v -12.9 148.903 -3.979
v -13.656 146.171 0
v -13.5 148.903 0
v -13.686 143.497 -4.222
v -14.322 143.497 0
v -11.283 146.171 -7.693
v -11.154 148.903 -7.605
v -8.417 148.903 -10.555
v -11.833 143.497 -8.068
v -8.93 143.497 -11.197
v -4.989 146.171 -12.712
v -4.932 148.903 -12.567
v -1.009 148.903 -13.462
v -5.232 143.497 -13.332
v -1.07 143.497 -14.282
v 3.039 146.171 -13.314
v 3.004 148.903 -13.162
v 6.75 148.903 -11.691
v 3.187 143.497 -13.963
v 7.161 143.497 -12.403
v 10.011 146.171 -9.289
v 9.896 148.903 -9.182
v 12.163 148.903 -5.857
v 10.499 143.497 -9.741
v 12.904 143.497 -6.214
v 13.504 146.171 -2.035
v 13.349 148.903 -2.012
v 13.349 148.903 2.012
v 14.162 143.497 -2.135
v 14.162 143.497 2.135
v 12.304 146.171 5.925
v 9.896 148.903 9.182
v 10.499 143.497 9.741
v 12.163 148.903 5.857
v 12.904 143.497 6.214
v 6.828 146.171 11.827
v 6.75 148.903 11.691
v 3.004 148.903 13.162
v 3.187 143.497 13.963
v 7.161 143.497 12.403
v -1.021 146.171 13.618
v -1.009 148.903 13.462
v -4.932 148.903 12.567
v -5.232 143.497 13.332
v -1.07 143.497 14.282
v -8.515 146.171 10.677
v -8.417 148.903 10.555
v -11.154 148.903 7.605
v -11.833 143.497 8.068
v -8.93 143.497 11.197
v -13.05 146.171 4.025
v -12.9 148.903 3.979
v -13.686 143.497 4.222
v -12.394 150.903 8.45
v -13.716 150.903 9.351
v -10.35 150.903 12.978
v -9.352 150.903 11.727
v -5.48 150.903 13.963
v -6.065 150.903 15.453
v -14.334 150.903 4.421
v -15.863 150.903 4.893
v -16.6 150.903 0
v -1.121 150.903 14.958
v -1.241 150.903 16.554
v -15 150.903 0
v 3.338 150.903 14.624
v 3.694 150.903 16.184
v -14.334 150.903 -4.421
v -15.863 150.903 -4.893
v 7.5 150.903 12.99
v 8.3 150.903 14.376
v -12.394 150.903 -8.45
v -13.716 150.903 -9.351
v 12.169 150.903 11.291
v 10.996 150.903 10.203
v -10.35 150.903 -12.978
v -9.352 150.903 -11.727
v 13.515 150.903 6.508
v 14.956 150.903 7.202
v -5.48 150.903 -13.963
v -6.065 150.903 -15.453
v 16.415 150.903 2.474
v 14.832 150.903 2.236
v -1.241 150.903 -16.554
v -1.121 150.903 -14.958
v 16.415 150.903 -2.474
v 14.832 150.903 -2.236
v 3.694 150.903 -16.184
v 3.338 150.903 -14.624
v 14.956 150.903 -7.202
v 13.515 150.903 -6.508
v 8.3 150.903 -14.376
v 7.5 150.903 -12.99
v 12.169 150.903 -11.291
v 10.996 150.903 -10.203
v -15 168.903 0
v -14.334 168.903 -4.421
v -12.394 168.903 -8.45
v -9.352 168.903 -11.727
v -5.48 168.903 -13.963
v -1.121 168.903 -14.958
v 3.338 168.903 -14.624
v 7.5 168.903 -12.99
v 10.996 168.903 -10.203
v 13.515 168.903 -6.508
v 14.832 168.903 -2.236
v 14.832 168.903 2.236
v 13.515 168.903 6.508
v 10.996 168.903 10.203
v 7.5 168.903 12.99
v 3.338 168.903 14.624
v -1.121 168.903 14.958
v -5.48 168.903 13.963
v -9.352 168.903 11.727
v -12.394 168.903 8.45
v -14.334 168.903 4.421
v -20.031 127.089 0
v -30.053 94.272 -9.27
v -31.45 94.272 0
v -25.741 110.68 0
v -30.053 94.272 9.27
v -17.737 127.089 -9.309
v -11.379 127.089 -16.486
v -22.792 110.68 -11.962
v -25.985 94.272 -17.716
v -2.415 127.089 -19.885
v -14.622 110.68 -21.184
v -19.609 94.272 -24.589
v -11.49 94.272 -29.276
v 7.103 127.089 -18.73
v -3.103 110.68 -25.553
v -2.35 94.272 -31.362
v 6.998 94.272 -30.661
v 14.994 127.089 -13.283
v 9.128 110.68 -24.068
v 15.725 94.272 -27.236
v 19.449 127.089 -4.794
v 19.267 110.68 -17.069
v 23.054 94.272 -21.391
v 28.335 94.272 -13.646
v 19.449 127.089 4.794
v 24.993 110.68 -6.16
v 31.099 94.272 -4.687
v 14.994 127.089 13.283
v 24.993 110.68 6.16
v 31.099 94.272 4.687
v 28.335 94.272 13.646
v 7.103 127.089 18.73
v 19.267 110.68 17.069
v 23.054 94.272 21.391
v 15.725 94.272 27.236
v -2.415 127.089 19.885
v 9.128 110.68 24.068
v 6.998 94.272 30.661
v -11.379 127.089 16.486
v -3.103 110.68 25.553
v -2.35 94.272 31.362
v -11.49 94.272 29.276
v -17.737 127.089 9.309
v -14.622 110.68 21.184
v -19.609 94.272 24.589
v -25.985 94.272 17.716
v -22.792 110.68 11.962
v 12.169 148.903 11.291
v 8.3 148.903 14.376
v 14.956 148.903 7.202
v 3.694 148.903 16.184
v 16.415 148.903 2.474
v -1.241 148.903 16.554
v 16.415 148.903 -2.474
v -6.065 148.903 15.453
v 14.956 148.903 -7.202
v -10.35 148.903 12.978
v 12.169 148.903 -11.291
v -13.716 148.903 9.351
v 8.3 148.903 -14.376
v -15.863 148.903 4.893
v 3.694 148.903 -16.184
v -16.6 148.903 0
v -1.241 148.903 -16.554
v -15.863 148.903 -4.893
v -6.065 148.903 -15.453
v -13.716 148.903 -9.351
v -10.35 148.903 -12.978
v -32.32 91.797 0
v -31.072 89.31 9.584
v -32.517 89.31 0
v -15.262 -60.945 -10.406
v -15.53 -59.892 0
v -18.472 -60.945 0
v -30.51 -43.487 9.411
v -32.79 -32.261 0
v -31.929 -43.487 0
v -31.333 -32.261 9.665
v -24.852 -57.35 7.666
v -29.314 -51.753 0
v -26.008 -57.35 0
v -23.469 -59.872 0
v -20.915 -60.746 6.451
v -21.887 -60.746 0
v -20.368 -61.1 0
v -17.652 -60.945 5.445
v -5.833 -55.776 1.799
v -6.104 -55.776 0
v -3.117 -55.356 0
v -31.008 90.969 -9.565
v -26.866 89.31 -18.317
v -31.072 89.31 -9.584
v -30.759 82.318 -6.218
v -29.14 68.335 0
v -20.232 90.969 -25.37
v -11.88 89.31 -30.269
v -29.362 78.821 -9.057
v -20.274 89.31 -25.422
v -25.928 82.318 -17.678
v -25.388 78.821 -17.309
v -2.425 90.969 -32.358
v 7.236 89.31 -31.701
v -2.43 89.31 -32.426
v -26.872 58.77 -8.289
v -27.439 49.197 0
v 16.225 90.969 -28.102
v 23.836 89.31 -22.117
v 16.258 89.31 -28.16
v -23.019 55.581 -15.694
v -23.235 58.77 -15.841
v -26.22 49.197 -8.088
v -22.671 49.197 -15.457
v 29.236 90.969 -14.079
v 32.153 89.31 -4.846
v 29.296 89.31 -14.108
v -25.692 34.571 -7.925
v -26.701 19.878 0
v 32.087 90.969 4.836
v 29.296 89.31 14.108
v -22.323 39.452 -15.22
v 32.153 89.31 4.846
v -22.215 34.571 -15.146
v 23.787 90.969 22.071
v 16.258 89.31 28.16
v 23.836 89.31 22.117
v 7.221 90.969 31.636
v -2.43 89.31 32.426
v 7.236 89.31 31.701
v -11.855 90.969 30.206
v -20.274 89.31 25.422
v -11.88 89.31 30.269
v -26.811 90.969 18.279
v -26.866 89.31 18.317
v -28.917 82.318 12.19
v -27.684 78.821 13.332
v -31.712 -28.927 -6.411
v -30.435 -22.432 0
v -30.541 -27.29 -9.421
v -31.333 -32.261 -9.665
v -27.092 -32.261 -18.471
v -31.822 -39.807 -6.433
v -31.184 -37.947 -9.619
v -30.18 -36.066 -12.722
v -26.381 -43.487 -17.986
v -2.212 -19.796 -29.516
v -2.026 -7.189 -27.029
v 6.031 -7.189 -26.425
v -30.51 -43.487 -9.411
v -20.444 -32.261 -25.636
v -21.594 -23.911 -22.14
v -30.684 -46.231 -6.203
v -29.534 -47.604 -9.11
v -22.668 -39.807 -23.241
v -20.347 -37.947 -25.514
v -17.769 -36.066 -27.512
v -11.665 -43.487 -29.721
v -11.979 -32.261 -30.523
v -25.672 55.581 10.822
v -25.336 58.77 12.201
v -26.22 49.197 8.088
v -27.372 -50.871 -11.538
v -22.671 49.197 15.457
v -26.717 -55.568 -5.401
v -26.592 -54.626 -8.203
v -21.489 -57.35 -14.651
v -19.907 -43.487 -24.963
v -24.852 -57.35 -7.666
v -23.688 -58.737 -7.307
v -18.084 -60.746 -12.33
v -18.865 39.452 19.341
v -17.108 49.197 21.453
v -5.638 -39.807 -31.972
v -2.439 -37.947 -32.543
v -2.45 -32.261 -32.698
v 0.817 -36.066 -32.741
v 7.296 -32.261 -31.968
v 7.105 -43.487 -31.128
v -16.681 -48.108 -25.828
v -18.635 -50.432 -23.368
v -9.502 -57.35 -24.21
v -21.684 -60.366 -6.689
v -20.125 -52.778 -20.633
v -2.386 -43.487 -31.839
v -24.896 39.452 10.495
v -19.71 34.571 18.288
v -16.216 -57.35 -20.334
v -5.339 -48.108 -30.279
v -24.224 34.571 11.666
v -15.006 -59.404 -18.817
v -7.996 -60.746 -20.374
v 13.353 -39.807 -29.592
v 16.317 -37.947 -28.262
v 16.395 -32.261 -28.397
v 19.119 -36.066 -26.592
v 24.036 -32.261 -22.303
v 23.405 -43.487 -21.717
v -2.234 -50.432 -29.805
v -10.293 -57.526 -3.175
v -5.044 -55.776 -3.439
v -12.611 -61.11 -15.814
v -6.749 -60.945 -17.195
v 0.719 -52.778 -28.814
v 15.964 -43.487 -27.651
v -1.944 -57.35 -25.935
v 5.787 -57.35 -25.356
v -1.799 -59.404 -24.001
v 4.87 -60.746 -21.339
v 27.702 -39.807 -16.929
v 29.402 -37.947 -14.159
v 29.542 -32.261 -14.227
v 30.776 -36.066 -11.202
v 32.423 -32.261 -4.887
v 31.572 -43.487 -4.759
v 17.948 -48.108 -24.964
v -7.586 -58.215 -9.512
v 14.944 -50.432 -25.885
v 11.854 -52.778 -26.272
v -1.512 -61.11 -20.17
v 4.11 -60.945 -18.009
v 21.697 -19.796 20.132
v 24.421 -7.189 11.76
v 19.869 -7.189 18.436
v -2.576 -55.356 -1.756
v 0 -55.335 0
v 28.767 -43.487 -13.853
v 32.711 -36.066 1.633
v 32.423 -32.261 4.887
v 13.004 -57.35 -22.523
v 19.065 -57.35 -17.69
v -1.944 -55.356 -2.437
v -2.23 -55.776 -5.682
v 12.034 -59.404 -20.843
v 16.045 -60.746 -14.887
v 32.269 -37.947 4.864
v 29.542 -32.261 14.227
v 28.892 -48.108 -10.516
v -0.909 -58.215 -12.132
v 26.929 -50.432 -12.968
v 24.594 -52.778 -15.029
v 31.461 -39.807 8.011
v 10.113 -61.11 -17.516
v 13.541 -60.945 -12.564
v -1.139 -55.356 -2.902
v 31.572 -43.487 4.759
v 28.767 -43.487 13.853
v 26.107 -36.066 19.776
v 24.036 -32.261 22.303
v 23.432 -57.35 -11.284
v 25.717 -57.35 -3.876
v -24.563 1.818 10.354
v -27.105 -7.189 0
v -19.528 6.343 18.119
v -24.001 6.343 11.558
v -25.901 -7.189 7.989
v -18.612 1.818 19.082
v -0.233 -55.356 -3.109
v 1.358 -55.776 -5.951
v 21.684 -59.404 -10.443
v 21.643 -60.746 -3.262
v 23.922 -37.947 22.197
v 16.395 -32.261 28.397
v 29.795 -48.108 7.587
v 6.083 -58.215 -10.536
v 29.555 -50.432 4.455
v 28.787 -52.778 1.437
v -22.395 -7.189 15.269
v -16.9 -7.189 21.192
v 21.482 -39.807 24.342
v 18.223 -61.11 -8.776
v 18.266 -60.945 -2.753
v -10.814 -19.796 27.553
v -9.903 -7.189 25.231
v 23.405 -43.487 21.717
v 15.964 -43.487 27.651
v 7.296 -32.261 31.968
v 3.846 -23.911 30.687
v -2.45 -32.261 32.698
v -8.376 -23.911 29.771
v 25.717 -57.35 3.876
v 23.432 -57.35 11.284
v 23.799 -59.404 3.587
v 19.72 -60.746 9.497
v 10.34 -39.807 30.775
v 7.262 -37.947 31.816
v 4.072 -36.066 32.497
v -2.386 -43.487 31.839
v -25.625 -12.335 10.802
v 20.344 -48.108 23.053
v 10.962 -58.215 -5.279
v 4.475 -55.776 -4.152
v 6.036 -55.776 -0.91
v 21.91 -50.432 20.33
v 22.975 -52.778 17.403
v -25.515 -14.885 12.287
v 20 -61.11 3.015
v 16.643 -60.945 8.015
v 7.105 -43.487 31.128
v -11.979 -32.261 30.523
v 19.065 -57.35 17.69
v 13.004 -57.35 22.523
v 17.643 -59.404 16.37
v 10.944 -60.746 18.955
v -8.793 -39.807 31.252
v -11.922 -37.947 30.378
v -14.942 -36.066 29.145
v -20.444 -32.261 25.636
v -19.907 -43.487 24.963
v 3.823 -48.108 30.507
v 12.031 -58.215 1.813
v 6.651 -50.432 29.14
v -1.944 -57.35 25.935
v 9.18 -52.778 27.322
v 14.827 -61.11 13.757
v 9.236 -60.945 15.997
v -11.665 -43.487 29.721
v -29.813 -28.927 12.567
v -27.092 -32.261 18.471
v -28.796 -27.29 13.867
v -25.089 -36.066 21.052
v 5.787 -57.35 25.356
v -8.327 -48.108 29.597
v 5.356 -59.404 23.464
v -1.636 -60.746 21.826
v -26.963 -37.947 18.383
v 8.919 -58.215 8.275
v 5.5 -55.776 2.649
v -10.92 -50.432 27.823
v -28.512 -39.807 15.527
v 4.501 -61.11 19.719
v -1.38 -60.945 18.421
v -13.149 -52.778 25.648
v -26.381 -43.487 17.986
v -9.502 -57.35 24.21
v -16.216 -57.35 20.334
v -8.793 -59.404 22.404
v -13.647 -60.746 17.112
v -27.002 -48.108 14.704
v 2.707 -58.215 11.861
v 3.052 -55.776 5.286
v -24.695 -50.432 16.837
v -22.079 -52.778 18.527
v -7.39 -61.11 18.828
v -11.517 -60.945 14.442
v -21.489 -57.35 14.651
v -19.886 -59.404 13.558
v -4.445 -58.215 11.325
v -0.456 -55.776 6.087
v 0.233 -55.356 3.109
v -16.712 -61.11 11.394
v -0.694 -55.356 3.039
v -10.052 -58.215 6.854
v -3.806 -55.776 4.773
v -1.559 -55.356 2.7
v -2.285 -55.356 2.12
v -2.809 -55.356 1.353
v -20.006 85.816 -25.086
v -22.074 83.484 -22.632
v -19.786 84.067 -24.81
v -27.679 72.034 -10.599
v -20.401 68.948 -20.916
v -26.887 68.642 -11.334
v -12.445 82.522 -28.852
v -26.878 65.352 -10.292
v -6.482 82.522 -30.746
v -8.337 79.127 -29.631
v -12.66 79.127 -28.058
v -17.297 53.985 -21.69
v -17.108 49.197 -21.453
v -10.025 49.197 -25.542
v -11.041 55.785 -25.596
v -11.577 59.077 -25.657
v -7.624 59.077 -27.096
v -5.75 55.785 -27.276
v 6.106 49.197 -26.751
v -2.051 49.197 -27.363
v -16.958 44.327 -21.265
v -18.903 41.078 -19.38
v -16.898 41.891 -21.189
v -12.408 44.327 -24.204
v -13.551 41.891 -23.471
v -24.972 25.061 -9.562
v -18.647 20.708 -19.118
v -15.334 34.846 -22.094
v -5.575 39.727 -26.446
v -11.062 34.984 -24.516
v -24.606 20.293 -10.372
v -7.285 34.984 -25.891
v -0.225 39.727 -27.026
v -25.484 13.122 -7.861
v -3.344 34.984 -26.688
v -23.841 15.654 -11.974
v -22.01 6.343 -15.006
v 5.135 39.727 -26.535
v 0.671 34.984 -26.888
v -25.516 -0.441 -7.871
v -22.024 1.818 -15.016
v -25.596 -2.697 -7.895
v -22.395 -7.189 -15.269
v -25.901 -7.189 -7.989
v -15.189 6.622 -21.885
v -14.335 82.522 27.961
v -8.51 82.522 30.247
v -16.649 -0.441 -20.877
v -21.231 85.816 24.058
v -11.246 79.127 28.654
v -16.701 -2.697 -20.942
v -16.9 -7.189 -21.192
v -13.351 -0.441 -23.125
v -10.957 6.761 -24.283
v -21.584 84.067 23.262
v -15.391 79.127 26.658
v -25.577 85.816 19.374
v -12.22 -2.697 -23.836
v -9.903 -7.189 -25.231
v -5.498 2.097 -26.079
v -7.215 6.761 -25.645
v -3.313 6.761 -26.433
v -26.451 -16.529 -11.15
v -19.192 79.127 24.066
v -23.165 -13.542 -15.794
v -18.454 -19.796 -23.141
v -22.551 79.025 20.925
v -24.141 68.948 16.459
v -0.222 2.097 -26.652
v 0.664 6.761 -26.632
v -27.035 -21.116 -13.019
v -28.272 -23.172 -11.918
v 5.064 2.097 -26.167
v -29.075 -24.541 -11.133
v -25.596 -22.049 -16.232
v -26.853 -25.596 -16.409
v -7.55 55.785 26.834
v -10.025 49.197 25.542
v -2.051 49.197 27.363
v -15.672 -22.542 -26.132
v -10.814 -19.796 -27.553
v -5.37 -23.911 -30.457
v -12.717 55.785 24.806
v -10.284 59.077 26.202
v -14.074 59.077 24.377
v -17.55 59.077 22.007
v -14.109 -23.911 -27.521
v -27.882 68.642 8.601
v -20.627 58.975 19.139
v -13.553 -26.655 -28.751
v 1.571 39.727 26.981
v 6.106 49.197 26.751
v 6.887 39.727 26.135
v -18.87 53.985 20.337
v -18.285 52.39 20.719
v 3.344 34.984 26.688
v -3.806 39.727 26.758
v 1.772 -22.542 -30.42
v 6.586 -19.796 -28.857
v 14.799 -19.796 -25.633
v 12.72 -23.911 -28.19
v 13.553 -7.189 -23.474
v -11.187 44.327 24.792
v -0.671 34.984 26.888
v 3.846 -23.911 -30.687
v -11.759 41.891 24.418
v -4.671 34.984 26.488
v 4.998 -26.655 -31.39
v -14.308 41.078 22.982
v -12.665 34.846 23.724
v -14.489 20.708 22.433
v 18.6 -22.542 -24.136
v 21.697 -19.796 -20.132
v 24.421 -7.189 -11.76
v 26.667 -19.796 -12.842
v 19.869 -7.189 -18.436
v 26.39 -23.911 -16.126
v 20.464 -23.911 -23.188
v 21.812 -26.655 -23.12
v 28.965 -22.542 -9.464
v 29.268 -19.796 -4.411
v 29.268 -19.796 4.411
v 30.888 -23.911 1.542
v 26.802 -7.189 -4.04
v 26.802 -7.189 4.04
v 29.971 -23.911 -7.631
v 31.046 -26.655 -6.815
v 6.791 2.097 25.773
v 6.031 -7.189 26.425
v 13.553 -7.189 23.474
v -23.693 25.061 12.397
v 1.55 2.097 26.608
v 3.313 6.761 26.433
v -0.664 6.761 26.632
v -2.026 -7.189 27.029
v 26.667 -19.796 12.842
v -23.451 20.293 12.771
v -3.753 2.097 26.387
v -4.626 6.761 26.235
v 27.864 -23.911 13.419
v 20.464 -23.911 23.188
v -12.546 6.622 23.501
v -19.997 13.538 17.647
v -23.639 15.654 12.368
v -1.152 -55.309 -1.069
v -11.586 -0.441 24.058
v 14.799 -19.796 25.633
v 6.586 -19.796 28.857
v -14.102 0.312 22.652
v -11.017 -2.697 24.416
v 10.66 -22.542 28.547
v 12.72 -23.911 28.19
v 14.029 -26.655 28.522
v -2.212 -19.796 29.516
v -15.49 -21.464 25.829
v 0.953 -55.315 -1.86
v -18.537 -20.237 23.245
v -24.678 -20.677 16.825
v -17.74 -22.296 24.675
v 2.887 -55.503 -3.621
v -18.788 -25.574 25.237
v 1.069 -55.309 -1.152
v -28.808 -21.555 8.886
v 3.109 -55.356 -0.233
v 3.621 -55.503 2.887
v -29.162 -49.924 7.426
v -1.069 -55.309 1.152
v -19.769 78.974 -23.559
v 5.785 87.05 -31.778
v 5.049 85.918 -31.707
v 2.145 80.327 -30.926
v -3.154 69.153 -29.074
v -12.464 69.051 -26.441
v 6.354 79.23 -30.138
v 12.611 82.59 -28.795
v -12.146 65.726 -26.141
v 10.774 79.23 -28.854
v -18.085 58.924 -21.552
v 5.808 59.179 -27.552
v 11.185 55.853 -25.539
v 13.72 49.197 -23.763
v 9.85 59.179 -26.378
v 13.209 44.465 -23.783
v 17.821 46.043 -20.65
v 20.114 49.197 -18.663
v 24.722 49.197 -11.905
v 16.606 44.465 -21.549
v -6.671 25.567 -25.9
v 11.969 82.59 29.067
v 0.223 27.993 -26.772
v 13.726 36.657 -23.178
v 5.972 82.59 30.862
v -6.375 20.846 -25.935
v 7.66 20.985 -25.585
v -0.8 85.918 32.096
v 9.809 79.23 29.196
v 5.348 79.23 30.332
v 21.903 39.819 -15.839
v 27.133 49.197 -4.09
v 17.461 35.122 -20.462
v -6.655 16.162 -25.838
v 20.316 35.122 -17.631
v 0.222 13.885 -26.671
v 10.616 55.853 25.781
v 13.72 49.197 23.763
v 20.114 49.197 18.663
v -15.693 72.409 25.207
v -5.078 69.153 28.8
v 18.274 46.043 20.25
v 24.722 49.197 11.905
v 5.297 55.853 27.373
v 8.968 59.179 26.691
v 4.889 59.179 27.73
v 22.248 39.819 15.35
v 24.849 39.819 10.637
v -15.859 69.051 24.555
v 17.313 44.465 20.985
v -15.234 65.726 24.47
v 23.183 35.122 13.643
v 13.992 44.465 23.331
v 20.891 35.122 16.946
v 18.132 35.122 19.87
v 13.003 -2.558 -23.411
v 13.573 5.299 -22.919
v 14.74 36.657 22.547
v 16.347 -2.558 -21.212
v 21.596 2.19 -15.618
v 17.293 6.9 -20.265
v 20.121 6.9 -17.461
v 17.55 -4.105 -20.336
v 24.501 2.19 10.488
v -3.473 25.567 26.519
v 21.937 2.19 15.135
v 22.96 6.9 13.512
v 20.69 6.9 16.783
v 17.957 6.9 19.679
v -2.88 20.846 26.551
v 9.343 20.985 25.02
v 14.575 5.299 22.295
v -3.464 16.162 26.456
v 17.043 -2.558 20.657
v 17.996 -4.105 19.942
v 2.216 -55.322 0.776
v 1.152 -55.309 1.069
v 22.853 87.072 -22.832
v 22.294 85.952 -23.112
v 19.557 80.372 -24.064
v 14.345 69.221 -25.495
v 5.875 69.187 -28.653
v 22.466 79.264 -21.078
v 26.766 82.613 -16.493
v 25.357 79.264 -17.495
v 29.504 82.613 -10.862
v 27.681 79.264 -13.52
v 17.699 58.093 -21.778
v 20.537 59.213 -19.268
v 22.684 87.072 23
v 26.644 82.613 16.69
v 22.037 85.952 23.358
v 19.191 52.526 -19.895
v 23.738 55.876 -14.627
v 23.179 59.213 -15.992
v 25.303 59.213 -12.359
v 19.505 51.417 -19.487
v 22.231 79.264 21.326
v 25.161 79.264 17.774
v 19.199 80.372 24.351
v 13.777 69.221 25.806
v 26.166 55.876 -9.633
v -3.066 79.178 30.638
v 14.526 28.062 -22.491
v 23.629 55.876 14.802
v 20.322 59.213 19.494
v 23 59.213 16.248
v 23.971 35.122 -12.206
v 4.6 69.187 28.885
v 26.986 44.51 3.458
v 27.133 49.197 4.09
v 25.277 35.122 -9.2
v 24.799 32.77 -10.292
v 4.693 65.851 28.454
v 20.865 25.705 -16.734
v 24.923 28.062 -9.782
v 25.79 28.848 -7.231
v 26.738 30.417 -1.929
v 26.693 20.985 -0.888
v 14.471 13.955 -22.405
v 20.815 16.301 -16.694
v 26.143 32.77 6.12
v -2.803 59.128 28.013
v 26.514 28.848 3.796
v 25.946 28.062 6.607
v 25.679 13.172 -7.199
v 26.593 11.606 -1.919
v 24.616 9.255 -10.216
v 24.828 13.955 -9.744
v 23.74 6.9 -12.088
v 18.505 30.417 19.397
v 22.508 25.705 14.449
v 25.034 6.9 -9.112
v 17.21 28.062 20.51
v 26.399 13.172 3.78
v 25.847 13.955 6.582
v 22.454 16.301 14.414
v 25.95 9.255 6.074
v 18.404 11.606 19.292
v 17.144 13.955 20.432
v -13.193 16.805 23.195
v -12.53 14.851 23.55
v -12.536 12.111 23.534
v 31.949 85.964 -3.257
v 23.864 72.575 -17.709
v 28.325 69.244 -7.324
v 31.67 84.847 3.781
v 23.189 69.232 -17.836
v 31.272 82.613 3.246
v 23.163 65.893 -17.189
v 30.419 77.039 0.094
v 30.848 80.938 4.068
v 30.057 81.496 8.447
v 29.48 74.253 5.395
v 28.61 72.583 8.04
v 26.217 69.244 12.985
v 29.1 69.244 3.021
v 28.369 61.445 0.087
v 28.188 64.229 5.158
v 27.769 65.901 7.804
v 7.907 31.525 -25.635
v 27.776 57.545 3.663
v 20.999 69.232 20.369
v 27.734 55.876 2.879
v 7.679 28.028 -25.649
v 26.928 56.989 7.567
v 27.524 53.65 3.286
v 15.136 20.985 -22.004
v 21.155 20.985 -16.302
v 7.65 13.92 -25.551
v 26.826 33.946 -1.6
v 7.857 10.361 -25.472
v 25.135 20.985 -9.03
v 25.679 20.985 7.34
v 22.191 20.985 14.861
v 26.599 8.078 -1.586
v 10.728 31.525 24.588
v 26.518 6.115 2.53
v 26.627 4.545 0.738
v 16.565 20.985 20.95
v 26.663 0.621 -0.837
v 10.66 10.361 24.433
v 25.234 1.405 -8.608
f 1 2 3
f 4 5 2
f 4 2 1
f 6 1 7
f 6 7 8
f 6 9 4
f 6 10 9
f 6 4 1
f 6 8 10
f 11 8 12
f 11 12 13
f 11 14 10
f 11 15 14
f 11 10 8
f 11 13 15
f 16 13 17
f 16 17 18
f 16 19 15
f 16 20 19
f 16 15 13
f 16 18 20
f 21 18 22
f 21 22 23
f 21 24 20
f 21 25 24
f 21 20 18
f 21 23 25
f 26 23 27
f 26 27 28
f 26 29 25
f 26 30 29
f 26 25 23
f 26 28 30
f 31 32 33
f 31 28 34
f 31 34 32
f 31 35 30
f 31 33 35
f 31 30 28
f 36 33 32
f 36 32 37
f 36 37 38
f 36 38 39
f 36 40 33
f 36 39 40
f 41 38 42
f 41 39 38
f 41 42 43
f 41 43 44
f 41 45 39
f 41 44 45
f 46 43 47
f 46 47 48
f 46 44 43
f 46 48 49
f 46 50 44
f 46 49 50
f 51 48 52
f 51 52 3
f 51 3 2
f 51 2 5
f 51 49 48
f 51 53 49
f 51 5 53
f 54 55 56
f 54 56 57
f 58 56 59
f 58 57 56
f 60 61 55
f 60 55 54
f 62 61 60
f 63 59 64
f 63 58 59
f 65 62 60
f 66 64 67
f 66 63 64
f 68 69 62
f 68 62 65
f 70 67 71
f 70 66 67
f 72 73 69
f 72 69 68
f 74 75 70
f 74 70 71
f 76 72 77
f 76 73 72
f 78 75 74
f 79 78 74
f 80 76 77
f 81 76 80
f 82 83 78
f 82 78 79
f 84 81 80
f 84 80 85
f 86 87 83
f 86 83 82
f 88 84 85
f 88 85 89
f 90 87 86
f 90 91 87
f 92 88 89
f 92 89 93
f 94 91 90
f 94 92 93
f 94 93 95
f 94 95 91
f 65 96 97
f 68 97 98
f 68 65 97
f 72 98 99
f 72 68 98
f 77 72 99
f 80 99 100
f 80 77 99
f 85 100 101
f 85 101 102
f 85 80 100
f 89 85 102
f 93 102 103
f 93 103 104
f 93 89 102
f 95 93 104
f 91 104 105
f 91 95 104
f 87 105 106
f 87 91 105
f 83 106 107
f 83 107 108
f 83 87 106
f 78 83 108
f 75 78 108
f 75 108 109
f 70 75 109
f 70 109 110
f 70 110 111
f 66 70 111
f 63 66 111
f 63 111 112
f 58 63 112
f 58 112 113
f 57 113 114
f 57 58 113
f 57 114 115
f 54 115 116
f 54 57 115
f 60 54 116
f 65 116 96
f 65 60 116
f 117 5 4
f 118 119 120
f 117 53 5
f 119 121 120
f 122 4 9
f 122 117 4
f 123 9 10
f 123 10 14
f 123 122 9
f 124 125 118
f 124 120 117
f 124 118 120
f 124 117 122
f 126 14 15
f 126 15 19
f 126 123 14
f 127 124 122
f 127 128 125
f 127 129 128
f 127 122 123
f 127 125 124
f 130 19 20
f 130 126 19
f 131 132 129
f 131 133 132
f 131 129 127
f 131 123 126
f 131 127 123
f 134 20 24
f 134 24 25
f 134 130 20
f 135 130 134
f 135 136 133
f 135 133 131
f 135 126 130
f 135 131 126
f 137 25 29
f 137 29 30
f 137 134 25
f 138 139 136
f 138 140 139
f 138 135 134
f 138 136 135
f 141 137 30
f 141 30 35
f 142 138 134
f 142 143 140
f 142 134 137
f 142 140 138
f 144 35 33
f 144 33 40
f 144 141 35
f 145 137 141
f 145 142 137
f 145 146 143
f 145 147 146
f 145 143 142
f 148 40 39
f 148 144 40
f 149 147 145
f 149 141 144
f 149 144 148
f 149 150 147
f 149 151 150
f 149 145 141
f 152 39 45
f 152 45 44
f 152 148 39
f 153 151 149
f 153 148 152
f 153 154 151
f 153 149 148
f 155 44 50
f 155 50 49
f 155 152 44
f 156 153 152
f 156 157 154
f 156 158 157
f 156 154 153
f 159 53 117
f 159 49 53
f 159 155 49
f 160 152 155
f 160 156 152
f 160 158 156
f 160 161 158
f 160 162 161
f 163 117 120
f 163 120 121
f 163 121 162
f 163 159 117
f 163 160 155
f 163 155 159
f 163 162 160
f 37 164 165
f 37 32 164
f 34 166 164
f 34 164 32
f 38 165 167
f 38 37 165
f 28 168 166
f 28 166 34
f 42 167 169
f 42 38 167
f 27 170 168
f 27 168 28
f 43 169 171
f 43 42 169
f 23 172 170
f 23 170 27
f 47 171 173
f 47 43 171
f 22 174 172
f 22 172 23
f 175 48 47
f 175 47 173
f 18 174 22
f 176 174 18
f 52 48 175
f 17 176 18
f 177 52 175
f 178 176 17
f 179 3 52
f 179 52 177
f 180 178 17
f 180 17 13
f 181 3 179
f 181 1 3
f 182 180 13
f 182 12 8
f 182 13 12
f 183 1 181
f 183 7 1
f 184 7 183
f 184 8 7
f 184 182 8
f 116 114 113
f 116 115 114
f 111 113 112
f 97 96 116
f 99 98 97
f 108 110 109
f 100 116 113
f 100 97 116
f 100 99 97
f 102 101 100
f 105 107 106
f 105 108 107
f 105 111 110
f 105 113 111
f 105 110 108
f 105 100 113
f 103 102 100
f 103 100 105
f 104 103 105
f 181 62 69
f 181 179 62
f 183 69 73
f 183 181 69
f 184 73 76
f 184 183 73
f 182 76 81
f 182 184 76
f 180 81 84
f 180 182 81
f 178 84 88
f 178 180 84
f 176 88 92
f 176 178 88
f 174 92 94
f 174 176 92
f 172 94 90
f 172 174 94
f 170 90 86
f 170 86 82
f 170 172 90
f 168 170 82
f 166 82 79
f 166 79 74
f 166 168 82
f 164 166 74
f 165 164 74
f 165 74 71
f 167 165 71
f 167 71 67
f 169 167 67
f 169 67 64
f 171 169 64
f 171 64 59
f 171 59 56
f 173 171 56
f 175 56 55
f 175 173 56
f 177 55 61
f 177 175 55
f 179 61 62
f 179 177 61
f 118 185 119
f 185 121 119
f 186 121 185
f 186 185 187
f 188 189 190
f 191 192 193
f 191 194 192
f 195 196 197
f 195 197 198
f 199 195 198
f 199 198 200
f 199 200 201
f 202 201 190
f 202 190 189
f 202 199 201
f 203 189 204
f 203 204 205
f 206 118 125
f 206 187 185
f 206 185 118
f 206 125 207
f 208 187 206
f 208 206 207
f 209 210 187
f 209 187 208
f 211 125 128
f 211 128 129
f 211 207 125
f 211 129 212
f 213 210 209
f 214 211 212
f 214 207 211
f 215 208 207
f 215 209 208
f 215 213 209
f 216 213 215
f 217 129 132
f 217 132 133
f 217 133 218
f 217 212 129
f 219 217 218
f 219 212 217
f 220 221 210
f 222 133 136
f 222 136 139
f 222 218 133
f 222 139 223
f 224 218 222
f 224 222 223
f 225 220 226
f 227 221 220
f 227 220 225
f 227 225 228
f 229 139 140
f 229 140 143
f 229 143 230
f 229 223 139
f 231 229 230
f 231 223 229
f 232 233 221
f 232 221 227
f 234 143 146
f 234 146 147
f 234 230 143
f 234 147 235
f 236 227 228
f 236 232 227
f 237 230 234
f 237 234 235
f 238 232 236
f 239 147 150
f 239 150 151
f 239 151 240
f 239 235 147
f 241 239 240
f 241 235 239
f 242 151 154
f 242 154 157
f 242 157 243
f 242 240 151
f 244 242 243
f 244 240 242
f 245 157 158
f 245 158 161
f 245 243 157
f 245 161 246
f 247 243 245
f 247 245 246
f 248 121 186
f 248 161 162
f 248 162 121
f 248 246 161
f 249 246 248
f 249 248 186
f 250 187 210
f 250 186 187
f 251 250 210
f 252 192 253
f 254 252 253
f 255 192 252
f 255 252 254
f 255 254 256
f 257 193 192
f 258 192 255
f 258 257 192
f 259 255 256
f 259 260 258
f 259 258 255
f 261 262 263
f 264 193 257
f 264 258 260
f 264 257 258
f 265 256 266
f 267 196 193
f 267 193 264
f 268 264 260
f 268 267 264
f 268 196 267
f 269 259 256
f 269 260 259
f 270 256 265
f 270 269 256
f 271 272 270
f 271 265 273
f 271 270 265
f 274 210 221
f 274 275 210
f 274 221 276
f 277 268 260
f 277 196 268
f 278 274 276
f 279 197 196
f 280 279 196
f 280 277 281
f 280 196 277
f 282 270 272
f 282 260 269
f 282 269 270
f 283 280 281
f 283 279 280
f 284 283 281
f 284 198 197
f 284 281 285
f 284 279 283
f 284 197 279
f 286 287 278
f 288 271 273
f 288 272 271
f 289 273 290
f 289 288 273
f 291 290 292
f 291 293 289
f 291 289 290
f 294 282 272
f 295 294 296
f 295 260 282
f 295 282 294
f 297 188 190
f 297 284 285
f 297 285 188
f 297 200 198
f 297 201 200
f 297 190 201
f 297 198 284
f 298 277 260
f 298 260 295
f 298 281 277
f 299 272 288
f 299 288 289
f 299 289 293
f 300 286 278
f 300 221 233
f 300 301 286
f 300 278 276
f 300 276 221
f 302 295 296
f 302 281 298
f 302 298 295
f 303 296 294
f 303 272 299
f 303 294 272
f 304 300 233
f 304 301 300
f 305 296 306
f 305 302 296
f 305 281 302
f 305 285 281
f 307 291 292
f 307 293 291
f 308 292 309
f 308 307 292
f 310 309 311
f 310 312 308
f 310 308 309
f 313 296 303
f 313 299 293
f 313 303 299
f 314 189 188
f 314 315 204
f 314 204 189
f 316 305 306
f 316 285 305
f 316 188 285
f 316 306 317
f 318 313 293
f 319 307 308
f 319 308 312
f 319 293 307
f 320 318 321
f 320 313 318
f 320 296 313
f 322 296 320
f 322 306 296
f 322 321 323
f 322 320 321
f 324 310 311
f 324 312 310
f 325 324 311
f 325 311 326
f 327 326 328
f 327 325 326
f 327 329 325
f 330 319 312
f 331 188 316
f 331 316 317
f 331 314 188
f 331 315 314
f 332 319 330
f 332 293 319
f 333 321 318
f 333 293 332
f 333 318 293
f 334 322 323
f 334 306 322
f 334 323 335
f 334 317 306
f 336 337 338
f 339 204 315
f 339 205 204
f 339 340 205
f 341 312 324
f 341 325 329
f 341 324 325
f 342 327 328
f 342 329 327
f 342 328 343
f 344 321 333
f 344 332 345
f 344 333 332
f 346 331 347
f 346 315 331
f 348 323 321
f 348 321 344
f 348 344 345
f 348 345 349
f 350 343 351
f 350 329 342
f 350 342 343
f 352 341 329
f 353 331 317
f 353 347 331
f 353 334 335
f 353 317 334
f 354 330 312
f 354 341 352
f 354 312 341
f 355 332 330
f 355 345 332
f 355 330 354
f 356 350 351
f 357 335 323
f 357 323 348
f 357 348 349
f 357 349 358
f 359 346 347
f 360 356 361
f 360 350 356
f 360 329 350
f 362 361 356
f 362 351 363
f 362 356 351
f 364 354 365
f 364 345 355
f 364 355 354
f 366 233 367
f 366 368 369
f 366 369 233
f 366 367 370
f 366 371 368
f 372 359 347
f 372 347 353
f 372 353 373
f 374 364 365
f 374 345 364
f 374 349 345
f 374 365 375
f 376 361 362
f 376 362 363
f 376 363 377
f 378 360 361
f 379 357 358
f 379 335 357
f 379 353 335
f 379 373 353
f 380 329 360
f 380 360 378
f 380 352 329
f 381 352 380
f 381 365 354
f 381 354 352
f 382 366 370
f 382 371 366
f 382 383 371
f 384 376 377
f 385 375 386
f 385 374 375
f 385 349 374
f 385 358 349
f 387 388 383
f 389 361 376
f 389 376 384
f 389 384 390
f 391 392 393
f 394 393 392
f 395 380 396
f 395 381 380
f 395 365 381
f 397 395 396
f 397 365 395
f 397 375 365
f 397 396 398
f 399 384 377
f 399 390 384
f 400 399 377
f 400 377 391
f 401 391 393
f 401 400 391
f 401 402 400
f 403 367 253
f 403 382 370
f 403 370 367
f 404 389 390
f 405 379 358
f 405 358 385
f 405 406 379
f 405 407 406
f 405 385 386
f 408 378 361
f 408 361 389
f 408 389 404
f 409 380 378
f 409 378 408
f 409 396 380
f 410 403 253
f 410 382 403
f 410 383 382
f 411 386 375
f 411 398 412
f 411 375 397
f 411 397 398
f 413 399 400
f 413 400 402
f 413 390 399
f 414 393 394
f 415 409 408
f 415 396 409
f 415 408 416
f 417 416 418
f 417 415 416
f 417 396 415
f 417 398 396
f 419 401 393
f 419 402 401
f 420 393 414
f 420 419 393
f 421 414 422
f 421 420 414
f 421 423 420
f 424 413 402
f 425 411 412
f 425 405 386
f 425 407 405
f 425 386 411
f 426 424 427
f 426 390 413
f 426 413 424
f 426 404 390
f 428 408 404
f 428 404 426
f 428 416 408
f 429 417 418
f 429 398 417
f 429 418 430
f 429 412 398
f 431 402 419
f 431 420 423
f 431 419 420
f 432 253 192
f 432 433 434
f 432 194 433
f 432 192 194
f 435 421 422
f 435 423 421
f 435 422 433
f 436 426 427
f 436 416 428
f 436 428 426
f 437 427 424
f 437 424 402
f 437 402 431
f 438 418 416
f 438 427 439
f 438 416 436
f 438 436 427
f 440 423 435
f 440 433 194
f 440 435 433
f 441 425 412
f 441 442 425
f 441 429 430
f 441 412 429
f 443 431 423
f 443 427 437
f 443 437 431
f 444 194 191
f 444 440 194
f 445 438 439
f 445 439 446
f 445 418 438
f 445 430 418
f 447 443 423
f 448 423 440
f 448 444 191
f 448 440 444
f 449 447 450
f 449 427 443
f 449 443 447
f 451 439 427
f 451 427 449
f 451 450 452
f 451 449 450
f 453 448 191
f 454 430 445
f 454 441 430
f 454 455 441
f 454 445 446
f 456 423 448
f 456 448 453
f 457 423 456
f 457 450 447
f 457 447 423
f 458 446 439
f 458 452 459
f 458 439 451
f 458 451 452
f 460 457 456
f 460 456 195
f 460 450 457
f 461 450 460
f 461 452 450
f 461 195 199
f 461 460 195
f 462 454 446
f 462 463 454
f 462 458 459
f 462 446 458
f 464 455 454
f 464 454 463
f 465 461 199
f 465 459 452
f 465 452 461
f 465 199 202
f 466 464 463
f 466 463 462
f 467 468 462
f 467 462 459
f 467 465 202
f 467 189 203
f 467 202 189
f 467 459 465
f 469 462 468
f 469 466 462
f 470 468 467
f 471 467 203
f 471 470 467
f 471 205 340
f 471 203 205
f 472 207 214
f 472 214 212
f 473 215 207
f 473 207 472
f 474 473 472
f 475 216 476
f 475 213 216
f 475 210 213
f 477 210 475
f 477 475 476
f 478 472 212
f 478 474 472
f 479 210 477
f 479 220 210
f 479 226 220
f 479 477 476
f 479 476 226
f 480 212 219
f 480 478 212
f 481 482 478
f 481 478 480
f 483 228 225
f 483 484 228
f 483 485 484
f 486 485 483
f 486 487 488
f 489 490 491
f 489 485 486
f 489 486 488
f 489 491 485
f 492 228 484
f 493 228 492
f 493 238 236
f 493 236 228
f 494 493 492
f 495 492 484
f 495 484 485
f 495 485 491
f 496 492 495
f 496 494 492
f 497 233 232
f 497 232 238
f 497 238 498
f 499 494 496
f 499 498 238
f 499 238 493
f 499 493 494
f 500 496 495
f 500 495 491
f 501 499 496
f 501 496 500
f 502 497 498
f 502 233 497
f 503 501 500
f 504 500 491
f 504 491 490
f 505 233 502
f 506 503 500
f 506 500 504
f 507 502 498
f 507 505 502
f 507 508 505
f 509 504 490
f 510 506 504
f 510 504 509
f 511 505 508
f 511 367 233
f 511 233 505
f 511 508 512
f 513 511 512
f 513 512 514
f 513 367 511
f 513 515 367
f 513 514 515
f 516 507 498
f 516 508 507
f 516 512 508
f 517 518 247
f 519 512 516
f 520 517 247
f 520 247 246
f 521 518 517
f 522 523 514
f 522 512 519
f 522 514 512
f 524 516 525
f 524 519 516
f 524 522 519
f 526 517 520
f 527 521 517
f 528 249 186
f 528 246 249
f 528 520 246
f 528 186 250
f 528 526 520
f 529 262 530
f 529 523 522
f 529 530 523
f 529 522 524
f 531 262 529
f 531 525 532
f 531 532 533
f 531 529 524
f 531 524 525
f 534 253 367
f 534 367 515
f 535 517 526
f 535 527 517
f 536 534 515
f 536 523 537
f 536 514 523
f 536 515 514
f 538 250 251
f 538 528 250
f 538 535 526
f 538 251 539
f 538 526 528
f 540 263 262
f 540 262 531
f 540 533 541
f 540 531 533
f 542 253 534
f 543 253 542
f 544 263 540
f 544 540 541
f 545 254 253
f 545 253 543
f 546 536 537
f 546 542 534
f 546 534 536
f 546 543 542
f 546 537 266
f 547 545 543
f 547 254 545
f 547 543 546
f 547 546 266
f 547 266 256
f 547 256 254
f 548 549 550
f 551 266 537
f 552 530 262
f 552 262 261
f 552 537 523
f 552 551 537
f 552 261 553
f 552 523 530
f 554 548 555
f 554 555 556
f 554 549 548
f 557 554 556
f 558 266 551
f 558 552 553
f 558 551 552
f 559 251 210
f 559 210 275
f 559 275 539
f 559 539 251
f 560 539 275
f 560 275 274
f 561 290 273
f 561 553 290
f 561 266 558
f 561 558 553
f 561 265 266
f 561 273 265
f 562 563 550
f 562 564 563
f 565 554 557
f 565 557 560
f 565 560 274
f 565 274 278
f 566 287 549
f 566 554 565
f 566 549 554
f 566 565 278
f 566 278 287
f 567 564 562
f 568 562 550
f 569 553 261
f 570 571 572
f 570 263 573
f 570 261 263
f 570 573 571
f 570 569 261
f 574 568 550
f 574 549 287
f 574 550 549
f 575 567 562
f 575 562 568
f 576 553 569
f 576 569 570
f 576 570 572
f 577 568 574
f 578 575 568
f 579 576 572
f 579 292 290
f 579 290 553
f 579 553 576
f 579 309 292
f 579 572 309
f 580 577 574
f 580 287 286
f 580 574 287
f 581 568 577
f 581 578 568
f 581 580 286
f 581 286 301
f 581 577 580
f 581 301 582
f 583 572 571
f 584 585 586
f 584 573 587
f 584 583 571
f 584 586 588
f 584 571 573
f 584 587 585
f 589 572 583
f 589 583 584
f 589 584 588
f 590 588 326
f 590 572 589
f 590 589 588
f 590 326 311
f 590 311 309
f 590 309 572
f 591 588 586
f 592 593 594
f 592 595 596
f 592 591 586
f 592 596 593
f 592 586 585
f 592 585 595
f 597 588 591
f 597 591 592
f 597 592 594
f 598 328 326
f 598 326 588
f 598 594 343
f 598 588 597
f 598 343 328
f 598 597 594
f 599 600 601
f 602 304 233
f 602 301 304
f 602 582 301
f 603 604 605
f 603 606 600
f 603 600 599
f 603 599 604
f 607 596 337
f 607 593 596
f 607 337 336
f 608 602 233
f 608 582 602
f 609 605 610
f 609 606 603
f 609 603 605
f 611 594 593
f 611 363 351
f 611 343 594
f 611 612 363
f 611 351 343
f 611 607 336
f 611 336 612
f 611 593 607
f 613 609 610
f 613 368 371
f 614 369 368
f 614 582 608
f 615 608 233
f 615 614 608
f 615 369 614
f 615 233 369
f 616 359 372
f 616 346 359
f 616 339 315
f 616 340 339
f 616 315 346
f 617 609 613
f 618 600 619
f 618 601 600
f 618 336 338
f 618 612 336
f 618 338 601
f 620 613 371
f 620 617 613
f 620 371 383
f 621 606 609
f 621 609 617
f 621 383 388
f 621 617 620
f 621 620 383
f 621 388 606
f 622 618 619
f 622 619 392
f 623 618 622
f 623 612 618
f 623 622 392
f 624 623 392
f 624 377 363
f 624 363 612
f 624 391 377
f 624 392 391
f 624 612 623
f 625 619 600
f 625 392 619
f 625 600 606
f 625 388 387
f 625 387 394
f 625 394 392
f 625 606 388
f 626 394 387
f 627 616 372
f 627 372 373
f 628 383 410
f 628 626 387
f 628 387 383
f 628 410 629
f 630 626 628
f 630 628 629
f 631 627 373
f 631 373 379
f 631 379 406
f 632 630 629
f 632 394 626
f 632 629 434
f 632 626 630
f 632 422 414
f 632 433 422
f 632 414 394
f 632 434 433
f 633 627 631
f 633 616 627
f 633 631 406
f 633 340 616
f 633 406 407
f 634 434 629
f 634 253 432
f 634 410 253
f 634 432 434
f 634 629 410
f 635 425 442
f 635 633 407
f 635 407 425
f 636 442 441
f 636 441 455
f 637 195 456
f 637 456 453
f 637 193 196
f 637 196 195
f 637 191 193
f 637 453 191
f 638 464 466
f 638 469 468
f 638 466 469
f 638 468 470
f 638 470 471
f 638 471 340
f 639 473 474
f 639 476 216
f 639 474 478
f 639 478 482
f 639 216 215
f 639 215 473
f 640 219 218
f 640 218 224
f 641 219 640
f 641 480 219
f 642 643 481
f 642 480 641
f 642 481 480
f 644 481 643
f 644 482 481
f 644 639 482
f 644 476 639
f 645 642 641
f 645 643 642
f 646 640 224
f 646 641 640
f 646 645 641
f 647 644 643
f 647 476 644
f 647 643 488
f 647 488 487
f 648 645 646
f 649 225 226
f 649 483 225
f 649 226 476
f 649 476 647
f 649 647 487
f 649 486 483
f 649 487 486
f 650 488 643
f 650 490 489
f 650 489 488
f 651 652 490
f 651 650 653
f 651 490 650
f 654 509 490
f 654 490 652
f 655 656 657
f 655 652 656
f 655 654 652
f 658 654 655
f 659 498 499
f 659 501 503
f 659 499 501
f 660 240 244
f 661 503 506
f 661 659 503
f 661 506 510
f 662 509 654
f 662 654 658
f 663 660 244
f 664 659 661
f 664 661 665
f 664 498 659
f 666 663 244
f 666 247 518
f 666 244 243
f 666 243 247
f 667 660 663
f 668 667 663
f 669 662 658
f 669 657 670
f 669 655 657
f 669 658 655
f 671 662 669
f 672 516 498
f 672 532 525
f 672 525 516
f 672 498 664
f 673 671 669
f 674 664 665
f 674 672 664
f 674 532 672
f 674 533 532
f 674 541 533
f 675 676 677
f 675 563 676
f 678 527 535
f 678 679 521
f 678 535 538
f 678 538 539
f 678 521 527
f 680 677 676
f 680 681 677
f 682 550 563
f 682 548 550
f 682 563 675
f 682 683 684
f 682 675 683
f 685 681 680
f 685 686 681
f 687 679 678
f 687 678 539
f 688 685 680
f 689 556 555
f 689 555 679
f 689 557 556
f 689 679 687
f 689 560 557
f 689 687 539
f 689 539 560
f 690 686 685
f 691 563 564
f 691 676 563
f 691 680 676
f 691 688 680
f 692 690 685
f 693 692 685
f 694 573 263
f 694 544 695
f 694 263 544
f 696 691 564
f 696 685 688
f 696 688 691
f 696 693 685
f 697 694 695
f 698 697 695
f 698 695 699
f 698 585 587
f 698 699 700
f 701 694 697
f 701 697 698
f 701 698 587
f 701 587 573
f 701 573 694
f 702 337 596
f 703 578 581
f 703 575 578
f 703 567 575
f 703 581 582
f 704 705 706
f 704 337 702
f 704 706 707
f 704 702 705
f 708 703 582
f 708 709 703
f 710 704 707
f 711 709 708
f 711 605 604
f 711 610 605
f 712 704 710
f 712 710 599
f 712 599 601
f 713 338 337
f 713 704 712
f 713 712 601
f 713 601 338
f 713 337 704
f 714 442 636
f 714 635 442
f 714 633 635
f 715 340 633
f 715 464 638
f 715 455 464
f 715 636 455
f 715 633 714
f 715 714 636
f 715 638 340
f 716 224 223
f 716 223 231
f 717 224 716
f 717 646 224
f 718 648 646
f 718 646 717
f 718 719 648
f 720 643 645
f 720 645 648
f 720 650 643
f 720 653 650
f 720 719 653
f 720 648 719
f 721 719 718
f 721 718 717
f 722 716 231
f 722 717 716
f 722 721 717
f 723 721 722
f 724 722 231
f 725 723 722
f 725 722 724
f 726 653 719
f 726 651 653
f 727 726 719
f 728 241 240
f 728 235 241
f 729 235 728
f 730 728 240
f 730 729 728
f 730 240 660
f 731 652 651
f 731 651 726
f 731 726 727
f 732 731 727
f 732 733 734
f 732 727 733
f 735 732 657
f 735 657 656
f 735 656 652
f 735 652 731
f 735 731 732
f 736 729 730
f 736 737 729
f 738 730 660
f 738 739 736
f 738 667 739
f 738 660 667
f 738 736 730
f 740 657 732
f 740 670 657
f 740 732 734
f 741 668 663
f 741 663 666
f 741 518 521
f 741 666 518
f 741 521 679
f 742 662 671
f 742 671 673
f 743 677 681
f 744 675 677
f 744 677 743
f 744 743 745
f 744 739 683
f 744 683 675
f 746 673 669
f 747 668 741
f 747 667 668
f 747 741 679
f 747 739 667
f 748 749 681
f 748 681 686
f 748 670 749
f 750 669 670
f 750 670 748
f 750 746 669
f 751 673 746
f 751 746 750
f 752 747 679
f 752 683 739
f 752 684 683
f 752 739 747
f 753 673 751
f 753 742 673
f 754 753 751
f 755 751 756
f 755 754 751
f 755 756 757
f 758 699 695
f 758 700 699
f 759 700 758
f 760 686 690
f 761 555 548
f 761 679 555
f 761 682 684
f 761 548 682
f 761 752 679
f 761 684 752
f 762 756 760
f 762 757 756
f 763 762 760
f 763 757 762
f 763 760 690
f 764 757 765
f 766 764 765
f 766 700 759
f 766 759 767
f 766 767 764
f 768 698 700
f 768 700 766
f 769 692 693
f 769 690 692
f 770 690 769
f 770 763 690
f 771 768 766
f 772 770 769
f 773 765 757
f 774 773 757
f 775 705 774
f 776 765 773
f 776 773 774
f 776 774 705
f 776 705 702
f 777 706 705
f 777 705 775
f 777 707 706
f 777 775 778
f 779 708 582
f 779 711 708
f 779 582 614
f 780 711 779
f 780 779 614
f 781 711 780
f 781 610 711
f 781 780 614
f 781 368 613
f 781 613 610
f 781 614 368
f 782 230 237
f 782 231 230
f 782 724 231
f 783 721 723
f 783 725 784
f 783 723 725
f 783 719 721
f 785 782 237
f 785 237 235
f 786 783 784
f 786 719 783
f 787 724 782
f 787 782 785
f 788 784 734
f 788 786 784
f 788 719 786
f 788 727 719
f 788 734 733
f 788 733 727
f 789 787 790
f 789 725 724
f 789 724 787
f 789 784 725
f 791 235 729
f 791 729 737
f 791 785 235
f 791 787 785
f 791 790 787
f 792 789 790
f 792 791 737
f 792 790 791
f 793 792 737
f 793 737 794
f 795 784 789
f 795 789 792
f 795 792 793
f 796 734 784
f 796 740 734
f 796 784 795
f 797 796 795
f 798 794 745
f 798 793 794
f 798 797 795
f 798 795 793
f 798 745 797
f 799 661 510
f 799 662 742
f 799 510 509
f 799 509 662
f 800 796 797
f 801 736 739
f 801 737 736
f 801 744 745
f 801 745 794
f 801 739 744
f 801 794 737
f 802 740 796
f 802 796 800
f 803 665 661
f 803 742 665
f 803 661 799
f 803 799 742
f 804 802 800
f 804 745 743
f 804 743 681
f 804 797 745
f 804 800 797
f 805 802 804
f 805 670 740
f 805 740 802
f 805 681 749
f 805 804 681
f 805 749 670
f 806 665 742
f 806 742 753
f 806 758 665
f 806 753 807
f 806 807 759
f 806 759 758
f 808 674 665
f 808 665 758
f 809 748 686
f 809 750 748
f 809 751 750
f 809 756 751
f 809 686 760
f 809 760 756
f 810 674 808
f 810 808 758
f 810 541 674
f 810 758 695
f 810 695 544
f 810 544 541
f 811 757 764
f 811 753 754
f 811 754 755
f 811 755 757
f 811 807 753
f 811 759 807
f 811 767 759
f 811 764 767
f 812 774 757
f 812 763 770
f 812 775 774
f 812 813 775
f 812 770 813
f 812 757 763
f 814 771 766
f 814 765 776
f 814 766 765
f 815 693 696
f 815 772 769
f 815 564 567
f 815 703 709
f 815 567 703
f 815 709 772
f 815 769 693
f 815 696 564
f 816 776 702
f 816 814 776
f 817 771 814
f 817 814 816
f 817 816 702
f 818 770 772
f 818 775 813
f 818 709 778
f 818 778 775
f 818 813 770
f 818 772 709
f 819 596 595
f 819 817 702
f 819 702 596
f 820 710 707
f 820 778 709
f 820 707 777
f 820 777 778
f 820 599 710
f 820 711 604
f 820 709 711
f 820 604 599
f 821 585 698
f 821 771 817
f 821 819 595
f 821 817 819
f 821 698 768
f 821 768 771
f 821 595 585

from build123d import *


with BuildPart() as part:
    # Sketch2 → Revolve2 (revolve)
    with BuildSketch(Plane.XY, mode=Mode.PRIVATE) as revolve2_sk:
        with BuildLine():
            Line((0, 168.903192951), (15, 168.903192951))
            Line((15, 168.903192951), (15, 150.903192951))
            Line((15, 150.903192951), (16.6, 150.903192951))
            Line((16.6, 150.903192951), (16.6, 148.903192951))
            Line((16.6, 148.903192951), (13.5, 148.903192951))
            add(Edge.make_bspline(
                [(13.5, 148.903192951), (13.434542306, 147.062564488), (13.708566417, 145.26063883), (14.322072332, 143.497415977)],
                knots=[0, 0, 0, 0, 1, 1, 1, 1], degree=3))
            Line((14.322072332, 143.497415977), (31.45, 94.271560556))
            add(Edge.make_bspline(
                [(31.45, 94.271560556), (33.229126476, 90.845001817), (26.551628462, 62.433806412), (26.823939199, 27.642446291), (26.534878828, -7.980277801), (29.779872762, -21.167076085), (32.957402386, -29.251025192), (32.695362988, -40.354526378), (31.042317735, -50.939796111), (22.16798563, -63.145599506), (13.030739968, -58.723683942), (6.82762256, -55.368152541), (1.956337431, -55.2690346), (0, -55.33481547)],
                knots=[0, 0, 0, 0, 0.05780284, 0.472965333, 0.582837644, 0.639270184, 0.696109455, 0.72354797, 0.819702818, 0.882564852, 0.920543744, 0.968756394, 1, 1, 1, 1], degree=3))
            Line((0, -55.33481547), (0, 168.903192951))
        make_face()
    revolve(revolve2_sk.sketch.rotate(Axis((0, 168.903192951, 0), (0, -1, 0)), 180), axis=Axis((0, 168.903192951, 0), (0, -1, 0)))


solid = part.part
